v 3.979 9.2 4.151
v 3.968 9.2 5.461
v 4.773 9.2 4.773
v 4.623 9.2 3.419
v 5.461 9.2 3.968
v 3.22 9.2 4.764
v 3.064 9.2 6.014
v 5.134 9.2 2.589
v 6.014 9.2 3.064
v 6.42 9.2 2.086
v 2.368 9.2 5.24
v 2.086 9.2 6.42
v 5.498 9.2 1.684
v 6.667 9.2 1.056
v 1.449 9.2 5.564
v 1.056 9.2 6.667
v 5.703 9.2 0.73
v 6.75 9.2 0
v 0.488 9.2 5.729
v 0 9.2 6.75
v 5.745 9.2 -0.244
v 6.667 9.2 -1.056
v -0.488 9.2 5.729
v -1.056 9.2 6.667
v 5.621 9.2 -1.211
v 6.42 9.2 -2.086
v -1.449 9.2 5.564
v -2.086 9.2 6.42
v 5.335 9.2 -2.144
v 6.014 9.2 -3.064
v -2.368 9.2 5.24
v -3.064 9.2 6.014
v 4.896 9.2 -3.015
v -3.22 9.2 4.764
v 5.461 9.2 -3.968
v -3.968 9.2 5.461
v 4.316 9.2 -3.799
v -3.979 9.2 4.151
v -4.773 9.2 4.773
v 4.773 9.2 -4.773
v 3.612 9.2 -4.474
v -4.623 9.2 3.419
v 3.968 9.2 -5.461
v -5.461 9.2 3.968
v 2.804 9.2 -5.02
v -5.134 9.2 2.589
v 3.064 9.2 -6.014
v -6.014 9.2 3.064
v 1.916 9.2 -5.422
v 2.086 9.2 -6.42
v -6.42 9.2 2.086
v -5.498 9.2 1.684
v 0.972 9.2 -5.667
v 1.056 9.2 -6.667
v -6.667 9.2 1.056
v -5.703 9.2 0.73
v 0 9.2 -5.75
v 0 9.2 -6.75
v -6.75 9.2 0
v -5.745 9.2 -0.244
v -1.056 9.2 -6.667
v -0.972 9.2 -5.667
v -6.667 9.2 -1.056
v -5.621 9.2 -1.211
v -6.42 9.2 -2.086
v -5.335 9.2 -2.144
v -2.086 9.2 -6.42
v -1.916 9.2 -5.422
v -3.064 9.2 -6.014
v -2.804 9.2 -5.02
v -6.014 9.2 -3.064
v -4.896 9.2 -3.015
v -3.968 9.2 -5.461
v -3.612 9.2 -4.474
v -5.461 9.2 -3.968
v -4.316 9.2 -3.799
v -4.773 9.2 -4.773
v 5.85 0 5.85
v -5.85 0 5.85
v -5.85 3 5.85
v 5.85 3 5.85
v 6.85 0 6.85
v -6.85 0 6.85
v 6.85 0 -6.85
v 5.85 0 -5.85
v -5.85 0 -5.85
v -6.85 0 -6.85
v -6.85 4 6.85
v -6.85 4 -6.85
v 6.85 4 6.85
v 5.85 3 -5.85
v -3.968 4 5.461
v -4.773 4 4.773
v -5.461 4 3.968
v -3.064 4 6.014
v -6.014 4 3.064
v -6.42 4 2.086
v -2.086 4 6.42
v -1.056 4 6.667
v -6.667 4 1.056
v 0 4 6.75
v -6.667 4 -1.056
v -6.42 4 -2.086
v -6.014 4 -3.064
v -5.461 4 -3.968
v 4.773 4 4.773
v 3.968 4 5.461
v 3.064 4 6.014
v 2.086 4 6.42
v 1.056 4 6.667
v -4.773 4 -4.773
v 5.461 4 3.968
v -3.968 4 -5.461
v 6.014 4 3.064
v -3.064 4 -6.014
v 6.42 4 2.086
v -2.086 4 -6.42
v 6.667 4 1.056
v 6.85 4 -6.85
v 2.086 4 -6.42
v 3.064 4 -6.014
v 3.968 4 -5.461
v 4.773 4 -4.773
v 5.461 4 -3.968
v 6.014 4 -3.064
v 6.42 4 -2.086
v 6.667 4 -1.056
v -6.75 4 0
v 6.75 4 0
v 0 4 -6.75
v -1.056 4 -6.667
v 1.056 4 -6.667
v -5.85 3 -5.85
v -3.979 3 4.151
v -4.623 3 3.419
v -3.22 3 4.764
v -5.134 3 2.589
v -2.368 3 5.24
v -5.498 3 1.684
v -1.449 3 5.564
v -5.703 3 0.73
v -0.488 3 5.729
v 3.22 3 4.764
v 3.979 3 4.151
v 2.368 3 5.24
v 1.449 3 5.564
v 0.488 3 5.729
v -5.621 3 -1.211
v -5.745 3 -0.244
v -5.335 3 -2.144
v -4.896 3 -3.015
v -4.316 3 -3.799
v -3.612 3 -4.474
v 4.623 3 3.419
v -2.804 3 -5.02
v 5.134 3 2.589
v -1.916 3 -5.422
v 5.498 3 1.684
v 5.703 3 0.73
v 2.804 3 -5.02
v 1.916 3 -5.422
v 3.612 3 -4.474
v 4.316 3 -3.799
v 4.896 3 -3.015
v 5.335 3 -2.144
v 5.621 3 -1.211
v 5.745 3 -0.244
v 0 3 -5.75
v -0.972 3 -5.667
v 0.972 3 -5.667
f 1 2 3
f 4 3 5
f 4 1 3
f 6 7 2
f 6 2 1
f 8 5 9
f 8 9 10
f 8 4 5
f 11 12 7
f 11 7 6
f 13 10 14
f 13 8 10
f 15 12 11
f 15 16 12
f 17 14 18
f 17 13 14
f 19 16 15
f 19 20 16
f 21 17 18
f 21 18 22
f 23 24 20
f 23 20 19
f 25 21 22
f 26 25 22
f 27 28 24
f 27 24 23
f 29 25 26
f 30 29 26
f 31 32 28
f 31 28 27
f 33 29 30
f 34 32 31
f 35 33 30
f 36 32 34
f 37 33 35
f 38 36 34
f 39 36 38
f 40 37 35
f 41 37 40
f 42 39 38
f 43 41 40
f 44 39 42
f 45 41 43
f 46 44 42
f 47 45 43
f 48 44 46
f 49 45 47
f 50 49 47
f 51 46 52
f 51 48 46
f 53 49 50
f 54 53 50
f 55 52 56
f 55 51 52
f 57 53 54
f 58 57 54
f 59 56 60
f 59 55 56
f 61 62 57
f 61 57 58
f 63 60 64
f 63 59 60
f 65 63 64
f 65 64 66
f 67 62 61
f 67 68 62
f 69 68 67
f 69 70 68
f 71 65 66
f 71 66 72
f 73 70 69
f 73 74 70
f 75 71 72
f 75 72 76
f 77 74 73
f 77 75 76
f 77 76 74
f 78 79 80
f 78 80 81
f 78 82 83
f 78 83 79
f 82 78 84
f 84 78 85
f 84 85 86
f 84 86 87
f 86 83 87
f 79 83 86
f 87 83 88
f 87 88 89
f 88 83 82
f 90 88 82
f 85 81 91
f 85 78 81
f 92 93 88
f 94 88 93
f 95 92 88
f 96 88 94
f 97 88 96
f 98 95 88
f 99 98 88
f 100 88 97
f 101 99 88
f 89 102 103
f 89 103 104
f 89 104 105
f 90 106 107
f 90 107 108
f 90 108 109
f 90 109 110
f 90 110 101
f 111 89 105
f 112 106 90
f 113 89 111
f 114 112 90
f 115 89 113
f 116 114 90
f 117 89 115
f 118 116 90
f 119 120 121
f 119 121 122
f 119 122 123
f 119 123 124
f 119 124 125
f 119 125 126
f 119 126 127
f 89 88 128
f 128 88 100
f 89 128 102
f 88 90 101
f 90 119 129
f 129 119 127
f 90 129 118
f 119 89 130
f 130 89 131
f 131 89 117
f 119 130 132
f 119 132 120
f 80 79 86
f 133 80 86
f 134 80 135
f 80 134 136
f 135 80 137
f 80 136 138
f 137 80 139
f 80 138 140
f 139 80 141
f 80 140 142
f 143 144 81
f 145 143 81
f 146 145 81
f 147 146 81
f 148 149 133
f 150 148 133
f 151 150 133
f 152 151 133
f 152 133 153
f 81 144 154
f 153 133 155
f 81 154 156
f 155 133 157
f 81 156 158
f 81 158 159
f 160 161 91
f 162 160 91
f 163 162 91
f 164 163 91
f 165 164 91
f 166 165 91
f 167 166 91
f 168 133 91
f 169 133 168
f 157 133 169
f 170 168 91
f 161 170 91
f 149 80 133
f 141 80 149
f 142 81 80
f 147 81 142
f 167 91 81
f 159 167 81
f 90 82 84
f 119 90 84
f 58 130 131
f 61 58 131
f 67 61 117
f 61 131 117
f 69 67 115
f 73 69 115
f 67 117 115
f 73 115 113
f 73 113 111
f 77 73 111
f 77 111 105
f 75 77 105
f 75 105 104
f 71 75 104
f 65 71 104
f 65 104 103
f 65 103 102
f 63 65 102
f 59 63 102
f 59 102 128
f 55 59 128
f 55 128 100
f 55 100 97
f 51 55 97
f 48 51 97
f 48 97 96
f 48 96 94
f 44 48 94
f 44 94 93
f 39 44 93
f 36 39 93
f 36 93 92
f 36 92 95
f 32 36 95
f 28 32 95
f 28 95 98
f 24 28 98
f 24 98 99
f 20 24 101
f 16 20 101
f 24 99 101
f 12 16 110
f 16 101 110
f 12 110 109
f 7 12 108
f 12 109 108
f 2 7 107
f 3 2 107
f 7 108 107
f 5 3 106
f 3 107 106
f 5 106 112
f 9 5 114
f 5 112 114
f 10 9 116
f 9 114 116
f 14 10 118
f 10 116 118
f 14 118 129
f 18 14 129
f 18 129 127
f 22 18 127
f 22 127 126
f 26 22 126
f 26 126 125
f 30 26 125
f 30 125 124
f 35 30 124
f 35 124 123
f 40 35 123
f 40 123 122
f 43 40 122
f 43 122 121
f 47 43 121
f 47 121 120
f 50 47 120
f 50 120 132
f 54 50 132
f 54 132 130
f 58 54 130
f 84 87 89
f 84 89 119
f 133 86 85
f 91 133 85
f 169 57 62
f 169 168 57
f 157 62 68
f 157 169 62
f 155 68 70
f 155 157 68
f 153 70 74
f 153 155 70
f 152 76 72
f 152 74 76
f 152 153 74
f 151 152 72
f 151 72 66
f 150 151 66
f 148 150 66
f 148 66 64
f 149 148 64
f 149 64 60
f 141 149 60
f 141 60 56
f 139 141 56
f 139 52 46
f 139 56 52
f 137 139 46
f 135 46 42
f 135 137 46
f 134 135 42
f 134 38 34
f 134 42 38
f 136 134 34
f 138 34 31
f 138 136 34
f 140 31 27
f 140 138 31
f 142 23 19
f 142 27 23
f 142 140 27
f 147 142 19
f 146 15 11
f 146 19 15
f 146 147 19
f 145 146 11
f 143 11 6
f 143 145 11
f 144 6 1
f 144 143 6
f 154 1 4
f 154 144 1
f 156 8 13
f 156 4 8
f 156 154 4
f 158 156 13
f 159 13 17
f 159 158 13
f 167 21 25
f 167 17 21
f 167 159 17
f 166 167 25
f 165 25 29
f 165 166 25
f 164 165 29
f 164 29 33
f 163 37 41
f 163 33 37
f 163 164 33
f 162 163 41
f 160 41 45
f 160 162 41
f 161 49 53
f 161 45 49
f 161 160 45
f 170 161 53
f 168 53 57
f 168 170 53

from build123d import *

# Parameters (mm, degrees)
SKETCH1_W           = 13.7
SKETCH1_H           = 13.7
BOSS_EXTRUDE1_DEPTH = 4
SKETCH2_R           = 6.75
BOSS_EXTRUDE2_DEPTH = 9.2
SHELL1_T            = -1


with BuildPart() as part:
    # Sketch1 → Boss-Extrude1 (new body)
    with BuildSketch(Plane(origin=(0, 0, 0), x_dir=(1, 0, 0), z_dir=(0, 1, 0))):
        Rectangle(SKETCH1_W, SKETCH1_H)
    extrude(amount=BOSS_EXTRUDE1_DEPTH)

    # Sketch2 → Boss-Extrude2 (add)
    with BuildSketch(Plane(origin=(0, 0, 0), x_dir=(1, 0, 0), z_dir=(0, 1, 0))):
        with Locations(Location((0, 0, 0), (0, 0, 90))):
            Circle(SKETCH2_R)
    extrude(amount=BOSS_EXTRUDE2_DEPTH)

    # Shell1
    shell1_openings = [part.faces().sort_by_distance(p)[0] for p in [
        (0, 9.2, 0),
        (0, 0, 0),
    ]]
    offset(amount=SHELL1_T, openings=shell1_openings, kind=Kind.INTERSECTION)


solid = part.part
